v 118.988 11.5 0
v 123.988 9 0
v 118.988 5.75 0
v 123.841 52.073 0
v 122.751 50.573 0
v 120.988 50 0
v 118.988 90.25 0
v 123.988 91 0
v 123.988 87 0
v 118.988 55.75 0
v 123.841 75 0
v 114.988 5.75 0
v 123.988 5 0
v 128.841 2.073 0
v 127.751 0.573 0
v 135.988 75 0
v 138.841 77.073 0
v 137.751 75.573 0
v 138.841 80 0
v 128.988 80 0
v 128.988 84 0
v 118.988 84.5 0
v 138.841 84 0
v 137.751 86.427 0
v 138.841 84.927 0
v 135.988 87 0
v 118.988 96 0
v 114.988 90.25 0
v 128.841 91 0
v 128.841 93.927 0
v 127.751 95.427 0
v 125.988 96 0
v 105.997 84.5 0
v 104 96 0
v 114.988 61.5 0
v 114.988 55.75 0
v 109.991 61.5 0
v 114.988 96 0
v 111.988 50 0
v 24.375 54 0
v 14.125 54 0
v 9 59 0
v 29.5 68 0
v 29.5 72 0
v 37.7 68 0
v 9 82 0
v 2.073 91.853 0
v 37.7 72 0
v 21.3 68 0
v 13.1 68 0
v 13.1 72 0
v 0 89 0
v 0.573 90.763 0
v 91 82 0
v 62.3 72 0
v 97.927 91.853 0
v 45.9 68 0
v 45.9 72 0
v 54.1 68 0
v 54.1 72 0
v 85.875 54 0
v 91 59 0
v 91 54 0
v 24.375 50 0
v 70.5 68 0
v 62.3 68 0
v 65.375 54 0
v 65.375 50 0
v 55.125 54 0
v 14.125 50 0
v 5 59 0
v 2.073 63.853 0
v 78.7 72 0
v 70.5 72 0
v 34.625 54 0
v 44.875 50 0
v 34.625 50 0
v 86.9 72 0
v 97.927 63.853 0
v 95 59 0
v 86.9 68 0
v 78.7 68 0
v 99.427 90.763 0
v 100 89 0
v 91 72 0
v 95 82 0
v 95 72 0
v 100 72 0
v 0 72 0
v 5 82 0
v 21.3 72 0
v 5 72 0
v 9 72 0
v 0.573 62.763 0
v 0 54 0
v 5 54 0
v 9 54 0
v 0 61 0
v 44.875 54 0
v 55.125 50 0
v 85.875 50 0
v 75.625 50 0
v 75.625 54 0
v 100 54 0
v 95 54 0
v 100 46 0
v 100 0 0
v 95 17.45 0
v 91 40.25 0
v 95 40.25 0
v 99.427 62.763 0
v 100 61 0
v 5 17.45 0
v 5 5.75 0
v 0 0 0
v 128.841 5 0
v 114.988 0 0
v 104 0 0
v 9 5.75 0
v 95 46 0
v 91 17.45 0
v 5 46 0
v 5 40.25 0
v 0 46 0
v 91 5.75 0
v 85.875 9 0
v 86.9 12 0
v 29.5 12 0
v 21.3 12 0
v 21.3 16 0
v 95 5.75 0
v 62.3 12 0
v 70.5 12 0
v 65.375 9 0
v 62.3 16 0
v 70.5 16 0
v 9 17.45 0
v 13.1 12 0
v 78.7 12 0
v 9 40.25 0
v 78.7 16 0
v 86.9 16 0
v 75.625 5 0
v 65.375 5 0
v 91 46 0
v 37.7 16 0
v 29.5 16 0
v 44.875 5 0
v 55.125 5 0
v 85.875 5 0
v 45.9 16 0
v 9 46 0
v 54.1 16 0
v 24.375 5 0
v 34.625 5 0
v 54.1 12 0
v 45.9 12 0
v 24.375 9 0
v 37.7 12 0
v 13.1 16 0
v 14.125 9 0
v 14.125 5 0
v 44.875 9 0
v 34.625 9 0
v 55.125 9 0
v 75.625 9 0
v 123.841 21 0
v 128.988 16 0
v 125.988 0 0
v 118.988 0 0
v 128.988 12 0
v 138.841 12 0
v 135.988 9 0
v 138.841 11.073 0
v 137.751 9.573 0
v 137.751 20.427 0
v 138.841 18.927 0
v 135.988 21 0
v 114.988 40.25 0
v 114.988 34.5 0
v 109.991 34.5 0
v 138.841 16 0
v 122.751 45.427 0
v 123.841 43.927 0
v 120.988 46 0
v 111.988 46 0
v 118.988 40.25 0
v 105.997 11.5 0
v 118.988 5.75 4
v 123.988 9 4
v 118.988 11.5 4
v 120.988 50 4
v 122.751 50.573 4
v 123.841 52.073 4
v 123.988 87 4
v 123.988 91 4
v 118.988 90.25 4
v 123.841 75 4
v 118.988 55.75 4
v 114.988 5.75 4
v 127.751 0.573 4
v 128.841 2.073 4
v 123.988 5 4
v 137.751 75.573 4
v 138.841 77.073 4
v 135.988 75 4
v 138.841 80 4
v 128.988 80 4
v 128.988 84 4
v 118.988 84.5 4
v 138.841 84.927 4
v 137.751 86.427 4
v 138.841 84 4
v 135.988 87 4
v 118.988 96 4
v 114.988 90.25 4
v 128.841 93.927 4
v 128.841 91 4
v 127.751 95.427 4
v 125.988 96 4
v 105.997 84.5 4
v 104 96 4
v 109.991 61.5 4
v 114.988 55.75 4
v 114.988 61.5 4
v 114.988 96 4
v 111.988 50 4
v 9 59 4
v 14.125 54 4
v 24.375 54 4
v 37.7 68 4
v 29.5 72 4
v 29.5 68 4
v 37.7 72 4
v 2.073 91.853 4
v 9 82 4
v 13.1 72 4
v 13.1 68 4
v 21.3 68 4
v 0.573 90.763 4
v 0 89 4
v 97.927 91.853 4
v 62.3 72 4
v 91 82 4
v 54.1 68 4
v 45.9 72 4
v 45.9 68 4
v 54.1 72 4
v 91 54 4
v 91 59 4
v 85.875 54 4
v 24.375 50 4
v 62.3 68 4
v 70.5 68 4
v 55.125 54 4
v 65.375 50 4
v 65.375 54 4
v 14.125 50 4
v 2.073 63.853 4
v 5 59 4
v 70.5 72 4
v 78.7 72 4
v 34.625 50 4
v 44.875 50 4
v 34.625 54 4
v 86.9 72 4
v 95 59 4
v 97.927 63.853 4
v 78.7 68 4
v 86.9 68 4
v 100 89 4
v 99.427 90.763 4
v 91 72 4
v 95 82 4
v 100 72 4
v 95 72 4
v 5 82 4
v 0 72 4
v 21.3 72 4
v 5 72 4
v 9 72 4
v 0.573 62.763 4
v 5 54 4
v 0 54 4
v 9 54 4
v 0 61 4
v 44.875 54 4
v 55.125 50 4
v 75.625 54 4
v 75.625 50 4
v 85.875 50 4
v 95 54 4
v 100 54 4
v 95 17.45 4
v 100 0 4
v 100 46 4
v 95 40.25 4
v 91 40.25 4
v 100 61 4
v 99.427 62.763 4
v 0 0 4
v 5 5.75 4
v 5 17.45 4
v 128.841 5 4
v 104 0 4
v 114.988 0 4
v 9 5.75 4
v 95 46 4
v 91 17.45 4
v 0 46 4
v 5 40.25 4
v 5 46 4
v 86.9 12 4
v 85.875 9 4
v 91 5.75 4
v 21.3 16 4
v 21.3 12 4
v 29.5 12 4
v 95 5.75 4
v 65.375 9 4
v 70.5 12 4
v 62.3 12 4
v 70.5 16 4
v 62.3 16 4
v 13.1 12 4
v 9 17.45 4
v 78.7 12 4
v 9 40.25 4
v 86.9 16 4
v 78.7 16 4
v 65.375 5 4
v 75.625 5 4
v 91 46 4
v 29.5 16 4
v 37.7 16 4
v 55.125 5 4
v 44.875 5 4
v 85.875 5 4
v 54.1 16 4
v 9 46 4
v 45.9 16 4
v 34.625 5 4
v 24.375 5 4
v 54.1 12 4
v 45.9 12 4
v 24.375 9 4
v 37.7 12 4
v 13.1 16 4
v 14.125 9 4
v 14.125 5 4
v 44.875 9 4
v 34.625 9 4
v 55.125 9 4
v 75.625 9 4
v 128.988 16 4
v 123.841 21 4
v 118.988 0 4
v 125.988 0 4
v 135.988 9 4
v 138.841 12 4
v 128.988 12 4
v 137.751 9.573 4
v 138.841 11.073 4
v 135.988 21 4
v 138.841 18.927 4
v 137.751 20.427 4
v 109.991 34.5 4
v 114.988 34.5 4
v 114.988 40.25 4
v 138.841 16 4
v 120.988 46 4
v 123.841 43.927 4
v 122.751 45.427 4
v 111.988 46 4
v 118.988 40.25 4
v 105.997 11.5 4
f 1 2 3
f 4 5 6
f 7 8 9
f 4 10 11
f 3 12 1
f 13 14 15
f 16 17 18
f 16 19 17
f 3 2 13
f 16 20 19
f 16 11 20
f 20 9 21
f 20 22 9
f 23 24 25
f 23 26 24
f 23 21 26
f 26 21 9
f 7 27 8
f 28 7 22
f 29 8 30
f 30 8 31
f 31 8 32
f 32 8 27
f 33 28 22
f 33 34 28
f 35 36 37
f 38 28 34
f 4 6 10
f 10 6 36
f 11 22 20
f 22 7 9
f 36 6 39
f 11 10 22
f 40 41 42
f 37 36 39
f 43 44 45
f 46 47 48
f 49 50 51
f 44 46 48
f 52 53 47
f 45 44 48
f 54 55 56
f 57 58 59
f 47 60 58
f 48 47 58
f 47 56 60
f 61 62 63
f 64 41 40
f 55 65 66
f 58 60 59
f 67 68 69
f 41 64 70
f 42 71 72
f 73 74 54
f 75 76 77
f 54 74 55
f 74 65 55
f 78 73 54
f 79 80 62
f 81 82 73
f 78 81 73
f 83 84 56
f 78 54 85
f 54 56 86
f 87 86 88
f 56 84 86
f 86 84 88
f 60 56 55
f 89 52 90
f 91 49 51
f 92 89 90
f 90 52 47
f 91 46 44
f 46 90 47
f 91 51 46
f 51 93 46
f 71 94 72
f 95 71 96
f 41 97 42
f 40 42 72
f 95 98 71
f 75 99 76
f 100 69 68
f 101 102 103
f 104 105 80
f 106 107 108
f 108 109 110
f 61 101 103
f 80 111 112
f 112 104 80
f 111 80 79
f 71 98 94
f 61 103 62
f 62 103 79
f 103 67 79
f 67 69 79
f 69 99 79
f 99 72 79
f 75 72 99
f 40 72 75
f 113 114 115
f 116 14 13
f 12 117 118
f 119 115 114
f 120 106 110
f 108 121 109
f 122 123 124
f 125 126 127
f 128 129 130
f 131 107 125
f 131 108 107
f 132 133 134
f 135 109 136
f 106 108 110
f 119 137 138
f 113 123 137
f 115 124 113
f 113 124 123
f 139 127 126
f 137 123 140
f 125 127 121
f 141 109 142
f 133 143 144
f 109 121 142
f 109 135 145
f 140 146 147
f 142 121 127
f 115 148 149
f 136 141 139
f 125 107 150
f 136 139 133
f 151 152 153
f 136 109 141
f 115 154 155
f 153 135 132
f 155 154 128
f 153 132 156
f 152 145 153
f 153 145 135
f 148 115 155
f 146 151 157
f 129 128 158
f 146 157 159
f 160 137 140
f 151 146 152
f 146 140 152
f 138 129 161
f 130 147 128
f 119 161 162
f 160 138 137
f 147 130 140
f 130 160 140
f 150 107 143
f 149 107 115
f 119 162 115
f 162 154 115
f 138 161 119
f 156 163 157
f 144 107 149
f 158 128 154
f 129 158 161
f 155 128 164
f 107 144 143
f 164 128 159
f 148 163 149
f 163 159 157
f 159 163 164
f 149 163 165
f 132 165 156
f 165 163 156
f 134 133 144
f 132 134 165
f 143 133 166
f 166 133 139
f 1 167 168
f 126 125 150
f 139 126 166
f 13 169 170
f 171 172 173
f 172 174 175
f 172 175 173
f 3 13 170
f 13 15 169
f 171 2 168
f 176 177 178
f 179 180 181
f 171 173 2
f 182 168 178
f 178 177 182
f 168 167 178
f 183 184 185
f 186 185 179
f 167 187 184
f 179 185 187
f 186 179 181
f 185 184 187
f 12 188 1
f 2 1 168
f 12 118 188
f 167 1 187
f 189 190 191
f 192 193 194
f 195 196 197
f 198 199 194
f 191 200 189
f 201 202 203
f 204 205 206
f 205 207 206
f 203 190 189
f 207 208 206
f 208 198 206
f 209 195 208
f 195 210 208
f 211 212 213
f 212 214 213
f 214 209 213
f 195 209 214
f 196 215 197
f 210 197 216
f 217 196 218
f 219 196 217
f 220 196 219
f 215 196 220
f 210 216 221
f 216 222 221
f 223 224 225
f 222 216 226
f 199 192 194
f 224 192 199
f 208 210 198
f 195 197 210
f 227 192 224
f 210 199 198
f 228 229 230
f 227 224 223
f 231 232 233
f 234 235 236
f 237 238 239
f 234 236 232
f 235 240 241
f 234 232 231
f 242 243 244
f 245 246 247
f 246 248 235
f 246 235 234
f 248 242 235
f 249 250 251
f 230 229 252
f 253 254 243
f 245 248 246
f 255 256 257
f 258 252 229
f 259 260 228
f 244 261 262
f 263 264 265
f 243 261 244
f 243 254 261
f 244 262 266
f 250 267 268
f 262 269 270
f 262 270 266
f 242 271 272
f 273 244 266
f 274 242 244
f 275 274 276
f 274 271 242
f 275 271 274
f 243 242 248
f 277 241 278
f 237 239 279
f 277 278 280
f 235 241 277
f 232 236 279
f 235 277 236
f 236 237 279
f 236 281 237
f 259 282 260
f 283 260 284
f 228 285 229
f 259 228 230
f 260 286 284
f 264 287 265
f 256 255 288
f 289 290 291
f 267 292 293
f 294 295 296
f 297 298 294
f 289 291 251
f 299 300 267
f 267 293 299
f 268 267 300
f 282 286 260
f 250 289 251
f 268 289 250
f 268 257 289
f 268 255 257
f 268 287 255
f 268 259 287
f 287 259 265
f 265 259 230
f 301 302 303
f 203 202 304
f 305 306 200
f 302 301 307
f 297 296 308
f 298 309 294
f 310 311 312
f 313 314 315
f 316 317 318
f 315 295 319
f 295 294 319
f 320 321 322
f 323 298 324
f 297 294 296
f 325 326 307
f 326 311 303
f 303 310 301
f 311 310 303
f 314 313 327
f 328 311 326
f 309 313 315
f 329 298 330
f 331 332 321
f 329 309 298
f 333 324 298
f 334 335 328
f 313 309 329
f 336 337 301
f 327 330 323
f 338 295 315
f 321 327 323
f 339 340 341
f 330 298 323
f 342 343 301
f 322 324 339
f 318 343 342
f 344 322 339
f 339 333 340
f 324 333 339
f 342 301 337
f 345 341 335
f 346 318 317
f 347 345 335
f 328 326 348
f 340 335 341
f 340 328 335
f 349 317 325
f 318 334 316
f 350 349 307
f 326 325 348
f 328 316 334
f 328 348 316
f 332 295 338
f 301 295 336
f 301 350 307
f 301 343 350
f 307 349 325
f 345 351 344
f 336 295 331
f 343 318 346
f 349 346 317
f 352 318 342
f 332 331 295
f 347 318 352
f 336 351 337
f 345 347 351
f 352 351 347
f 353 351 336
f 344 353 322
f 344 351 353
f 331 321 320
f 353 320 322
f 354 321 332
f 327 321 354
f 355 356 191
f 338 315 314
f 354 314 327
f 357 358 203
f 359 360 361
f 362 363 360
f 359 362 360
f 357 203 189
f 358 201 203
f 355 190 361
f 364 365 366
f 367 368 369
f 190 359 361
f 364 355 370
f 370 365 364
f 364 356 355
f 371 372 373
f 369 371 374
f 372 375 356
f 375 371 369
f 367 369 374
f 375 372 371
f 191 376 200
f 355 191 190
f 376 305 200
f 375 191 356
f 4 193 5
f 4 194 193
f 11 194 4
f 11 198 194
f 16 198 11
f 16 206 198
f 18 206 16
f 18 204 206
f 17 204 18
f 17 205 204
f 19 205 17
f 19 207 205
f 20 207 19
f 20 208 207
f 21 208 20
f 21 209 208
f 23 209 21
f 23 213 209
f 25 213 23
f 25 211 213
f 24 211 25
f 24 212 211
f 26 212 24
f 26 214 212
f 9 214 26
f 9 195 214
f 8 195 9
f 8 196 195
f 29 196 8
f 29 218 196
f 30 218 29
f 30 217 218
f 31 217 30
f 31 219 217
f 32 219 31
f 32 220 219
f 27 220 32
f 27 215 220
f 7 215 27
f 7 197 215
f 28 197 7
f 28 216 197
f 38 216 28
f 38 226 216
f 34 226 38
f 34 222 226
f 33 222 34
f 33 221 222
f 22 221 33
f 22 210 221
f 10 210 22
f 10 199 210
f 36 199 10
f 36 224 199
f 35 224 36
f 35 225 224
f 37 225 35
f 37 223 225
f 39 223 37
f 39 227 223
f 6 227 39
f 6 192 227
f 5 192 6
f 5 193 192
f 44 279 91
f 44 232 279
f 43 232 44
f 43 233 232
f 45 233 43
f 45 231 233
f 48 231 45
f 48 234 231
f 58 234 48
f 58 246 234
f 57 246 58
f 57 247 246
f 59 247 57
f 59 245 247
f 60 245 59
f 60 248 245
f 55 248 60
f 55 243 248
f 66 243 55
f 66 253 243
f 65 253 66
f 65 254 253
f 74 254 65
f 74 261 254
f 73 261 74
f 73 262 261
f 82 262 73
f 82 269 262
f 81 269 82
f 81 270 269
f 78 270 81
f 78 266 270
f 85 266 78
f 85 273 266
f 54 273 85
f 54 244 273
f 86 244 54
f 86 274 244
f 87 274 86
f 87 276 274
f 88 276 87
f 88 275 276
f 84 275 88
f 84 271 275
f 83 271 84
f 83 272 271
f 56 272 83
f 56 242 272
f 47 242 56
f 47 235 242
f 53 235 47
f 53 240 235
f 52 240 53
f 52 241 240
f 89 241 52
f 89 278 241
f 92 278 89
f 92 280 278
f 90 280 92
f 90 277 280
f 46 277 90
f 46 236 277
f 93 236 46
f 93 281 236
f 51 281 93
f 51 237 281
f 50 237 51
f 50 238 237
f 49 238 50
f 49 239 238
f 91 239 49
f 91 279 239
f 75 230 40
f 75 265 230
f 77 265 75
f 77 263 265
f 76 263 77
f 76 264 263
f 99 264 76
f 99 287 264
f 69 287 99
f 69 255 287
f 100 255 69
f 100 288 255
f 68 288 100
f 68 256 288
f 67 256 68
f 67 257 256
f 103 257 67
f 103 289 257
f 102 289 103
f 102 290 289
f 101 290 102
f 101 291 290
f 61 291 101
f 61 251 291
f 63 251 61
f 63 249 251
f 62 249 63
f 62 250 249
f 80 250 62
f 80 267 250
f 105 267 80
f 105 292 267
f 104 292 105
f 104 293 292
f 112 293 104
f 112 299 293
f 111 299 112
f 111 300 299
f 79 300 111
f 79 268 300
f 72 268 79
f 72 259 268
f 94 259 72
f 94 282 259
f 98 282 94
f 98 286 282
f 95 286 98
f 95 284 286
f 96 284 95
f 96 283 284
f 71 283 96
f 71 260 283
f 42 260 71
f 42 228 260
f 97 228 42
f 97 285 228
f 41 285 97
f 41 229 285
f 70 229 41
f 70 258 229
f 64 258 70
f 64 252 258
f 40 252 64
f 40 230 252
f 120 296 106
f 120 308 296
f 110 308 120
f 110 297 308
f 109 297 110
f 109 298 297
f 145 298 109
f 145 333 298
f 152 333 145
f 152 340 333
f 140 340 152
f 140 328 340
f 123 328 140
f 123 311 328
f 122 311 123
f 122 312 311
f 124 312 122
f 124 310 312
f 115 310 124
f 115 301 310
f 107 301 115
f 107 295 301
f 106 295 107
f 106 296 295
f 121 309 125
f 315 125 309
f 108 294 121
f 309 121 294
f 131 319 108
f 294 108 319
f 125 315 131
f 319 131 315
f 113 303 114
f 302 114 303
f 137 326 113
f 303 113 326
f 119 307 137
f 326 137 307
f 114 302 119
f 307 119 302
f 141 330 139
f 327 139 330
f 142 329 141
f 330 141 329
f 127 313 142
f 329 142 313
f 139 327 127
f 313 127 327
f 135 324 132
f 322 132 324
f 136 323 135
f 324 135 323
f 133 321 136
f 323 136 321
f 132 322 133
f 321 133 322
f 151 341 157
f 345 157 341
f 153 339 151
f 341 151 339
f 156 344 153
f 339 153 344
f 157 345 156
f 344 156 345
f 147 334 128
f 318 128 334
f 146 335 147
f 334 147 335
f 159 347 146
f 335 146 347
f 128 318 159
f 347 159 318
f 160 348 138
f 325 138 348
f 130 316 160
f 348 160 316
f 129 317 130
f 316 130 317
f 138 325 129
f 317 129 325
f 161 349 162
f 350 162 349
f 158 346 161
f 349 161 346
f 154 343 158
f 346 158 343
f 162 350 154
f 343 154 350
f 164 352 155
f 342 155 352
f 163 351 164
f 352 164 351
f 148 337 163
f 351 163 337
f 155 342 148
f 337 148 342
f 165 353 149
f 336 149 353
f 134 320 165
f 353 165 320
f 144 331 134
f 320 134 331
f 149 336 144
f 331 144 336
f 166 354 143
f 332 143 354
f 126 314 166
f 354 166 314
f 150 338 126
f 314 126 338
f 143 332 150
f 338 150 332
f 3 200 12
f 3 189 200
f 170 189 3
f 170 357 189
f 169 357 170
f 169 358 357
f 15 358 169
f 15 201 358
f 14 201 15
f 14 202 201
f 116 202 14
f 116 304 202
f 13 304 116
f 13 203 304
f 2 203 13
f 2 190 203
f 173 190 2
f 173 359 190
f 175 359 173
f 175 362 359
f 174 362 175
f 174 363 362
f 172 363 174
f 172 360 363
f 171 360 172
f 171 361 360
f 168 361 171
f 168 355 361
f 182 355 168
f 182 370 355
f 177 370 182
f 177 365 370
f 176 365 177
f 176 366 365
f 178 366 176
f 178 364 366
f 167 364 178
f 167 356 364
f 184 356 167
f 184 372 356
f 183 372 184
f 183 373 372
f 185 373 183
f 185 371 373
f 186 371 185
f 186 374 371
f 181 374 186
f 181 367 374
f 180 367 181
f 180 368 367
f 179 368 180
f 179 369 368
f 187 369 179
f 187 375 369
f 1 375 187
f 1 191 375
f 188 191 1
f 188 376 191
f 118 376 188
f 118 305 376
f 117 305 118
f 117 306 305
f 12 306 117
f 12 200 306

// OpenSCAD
// ajuste de qualidade
//$fa=1; // minimo angulo
//$fs=0.01; // minimo segmento
//$fn=36;

//relativo ao material
// espessura do material
thick=4; 

// borda necessária para montagem
reserva=5;

// largura total
width=100;
 
// extensão para estabilidade
extra=30; 

// altura do primeiro apoio
height_1=20;

// altura do segundo apoio
height_2=10; 

// encaixes do primeiro apoio
qt_slot_1=5; 


// encaixes do segundo apoio
qt_slot_2=4;

// espaço entre paredes
between=3; 

// proportion taken by each slot relative to total depth
base_slot = 1/4; 

// altura extra para evitar fragilidade da base
neck = 3; 

//angulo das cartas
theta = 10; 

//calculo intermediario
radius=min(between,reserva); // raio da borda arredondada
fit=0.1+abs(height_1-height_2); // para evitar problemas no difference

ext_norm=max(extra,reserva);
h_base=ext_norm+thick+between+thick+reserva;
h_p2=height_2+thick;
h_p1=height_1+thick;
hb = h_base*sin(theta);
slot_w = base_slot*h_base;
slot_h = 0.1+hb+neck+thick;	

linear_extrude(height = thick){
//base
difference(){
	square([width,h_base]);
	
	translate([0,reserva,0])
		encaixes(largura=width, altura=thick, qt=qt_slot_2, borda=reserva+thick);
	translate([0,reserva+between+thick,0])
		encaixes(largura=width, altura=thick, qt=qt_slot_1, borda=reserva+thick);
//desenhar os encaixes da lateral
	translate([reserva,slot_w/2,0])
		square([thick,slot_w+0.2/**/]);
	translate([width-thick-reserva,slot_w/2,0])
		square([thick,slot_w+0.2/**/]);
	translate([reserva,h_base-slot_w/2,0])
		square([thick,slot_w/2+0.2/**/]);
	translate([width-thick-reserva,h_base-slot_w/2,0])
		square([thick,slot_w/2+0.2/**/]);

}

// segundo apoio
translate([0,h_base+thick,0])
	parede (height_2,qt_slot_2);


// primeiro apoio
translate([0,h_base+thick+h_p2+thick,0])
	parede (height_1,qt_slot_1);

// laterais
rotate (-90) translate([-h_base,width+thick,0])
	lateral();
rotate (-90) translate([-(h_base+thick),width+thick,0]) mirror([1,0,0]) 
	lateral();
}
///////////////////////////////////////////////////////////////////
module lateral () {
	
//	polygon(points = [[h_base,0],[0,h_base*sin(theta)],[h_base,h_base*sin(theta)]]);
	difference() {
		union(){
			polygon(points = [[h_base,0],[0,h_base*sin(theta)],[h_base,h_base*sin(theta)]]);
			translate([0,hb,0]) 
				apoio(largura=h_base/*ext_norm+reserva+thick+between+thick/**/, altura=neck+thick+reserva, raio=radius);
			// lateral
			translate([ext_norm-reserva,neck+thick+hb,0])
				apoio(largura=reserva+thick+between, altura=height_1, raio=between);
			translate([ext_norm+thick,neck+thick+hb,0])
				apoio(largura=between+thick+reserva, altura=height_2, raio=between);
		};
	// aplicar encaixes na junção da peça
		translate([ext_norm-reserva,neck+thick+hb,0])
			fenda (xx=reserva, altura=height_1, parede=thick, baixo=false);
		translate([ext_norm+thick,neck+thick+hb,0])
			fenda (xx=between, altura=height_2, parede=thick, baixo=false);
		translate([slot_w,-(0.1),0])
			square([h_base-2*slot_w,slot_h]);
		translate([slot_w/2,hb+neck,0])
			square([slot_w/2+0.1,thick]);
		translate([h_base-slot_w/2,hb+neck,0])
			square([slot_w/2+0.1,thick]);
	}
}

module parede(hh,nn) {
	union(){
		encaixes(largura=width, altura=thick, qt=nn, borda=reserva+thick);
		translate([0,thick,0])
			difference() {
				apoio(largura=width, altura=hh, raio=radius);
				fendas_apoio(largura=width,altura=hh, parede=thick, borda=reserva);
			}
	}
}

module fendas_apoio(largura, altura, parede, borda=0, baixo=true) {

	fenda (xx=borda, altura=altura, parede=parede, baixo=baixo);
	fenda (xx=largura-borda-parede, altura=altura, parede=parede, baixo=baixo);
	
}

///////////////////////////////////////////////////////////////////
module apoio(largura, altura, raio=1) {
	hull(){
		square(size=[largura,0.01],center=false);
	//cortar os circulos?
		translate([raio,altura-raio,0])circle(r=raio);
		translate([largura-raio,altura-raio,0])circle(r=raio);
	}
}

module encaixes (largura, altura, qt=1, proporcao=0.5, borda=0) {
	total=largura-2*borda;
	passo=total/qt;
	for (i=[0:passo:total]){
		if (i < total) {
			translate([borda+i+passo/2,altura/2,0])square(size=[passo*proporcao,altura],center=true);
		}
	}
} 

module fenda(xx, altura, parede, baixo=true) {
	
	yy=baixo?-fit:altura/2;

	translate([xx,yy,0]) square(size=[parede,altura/2+fit],center=false);

}

